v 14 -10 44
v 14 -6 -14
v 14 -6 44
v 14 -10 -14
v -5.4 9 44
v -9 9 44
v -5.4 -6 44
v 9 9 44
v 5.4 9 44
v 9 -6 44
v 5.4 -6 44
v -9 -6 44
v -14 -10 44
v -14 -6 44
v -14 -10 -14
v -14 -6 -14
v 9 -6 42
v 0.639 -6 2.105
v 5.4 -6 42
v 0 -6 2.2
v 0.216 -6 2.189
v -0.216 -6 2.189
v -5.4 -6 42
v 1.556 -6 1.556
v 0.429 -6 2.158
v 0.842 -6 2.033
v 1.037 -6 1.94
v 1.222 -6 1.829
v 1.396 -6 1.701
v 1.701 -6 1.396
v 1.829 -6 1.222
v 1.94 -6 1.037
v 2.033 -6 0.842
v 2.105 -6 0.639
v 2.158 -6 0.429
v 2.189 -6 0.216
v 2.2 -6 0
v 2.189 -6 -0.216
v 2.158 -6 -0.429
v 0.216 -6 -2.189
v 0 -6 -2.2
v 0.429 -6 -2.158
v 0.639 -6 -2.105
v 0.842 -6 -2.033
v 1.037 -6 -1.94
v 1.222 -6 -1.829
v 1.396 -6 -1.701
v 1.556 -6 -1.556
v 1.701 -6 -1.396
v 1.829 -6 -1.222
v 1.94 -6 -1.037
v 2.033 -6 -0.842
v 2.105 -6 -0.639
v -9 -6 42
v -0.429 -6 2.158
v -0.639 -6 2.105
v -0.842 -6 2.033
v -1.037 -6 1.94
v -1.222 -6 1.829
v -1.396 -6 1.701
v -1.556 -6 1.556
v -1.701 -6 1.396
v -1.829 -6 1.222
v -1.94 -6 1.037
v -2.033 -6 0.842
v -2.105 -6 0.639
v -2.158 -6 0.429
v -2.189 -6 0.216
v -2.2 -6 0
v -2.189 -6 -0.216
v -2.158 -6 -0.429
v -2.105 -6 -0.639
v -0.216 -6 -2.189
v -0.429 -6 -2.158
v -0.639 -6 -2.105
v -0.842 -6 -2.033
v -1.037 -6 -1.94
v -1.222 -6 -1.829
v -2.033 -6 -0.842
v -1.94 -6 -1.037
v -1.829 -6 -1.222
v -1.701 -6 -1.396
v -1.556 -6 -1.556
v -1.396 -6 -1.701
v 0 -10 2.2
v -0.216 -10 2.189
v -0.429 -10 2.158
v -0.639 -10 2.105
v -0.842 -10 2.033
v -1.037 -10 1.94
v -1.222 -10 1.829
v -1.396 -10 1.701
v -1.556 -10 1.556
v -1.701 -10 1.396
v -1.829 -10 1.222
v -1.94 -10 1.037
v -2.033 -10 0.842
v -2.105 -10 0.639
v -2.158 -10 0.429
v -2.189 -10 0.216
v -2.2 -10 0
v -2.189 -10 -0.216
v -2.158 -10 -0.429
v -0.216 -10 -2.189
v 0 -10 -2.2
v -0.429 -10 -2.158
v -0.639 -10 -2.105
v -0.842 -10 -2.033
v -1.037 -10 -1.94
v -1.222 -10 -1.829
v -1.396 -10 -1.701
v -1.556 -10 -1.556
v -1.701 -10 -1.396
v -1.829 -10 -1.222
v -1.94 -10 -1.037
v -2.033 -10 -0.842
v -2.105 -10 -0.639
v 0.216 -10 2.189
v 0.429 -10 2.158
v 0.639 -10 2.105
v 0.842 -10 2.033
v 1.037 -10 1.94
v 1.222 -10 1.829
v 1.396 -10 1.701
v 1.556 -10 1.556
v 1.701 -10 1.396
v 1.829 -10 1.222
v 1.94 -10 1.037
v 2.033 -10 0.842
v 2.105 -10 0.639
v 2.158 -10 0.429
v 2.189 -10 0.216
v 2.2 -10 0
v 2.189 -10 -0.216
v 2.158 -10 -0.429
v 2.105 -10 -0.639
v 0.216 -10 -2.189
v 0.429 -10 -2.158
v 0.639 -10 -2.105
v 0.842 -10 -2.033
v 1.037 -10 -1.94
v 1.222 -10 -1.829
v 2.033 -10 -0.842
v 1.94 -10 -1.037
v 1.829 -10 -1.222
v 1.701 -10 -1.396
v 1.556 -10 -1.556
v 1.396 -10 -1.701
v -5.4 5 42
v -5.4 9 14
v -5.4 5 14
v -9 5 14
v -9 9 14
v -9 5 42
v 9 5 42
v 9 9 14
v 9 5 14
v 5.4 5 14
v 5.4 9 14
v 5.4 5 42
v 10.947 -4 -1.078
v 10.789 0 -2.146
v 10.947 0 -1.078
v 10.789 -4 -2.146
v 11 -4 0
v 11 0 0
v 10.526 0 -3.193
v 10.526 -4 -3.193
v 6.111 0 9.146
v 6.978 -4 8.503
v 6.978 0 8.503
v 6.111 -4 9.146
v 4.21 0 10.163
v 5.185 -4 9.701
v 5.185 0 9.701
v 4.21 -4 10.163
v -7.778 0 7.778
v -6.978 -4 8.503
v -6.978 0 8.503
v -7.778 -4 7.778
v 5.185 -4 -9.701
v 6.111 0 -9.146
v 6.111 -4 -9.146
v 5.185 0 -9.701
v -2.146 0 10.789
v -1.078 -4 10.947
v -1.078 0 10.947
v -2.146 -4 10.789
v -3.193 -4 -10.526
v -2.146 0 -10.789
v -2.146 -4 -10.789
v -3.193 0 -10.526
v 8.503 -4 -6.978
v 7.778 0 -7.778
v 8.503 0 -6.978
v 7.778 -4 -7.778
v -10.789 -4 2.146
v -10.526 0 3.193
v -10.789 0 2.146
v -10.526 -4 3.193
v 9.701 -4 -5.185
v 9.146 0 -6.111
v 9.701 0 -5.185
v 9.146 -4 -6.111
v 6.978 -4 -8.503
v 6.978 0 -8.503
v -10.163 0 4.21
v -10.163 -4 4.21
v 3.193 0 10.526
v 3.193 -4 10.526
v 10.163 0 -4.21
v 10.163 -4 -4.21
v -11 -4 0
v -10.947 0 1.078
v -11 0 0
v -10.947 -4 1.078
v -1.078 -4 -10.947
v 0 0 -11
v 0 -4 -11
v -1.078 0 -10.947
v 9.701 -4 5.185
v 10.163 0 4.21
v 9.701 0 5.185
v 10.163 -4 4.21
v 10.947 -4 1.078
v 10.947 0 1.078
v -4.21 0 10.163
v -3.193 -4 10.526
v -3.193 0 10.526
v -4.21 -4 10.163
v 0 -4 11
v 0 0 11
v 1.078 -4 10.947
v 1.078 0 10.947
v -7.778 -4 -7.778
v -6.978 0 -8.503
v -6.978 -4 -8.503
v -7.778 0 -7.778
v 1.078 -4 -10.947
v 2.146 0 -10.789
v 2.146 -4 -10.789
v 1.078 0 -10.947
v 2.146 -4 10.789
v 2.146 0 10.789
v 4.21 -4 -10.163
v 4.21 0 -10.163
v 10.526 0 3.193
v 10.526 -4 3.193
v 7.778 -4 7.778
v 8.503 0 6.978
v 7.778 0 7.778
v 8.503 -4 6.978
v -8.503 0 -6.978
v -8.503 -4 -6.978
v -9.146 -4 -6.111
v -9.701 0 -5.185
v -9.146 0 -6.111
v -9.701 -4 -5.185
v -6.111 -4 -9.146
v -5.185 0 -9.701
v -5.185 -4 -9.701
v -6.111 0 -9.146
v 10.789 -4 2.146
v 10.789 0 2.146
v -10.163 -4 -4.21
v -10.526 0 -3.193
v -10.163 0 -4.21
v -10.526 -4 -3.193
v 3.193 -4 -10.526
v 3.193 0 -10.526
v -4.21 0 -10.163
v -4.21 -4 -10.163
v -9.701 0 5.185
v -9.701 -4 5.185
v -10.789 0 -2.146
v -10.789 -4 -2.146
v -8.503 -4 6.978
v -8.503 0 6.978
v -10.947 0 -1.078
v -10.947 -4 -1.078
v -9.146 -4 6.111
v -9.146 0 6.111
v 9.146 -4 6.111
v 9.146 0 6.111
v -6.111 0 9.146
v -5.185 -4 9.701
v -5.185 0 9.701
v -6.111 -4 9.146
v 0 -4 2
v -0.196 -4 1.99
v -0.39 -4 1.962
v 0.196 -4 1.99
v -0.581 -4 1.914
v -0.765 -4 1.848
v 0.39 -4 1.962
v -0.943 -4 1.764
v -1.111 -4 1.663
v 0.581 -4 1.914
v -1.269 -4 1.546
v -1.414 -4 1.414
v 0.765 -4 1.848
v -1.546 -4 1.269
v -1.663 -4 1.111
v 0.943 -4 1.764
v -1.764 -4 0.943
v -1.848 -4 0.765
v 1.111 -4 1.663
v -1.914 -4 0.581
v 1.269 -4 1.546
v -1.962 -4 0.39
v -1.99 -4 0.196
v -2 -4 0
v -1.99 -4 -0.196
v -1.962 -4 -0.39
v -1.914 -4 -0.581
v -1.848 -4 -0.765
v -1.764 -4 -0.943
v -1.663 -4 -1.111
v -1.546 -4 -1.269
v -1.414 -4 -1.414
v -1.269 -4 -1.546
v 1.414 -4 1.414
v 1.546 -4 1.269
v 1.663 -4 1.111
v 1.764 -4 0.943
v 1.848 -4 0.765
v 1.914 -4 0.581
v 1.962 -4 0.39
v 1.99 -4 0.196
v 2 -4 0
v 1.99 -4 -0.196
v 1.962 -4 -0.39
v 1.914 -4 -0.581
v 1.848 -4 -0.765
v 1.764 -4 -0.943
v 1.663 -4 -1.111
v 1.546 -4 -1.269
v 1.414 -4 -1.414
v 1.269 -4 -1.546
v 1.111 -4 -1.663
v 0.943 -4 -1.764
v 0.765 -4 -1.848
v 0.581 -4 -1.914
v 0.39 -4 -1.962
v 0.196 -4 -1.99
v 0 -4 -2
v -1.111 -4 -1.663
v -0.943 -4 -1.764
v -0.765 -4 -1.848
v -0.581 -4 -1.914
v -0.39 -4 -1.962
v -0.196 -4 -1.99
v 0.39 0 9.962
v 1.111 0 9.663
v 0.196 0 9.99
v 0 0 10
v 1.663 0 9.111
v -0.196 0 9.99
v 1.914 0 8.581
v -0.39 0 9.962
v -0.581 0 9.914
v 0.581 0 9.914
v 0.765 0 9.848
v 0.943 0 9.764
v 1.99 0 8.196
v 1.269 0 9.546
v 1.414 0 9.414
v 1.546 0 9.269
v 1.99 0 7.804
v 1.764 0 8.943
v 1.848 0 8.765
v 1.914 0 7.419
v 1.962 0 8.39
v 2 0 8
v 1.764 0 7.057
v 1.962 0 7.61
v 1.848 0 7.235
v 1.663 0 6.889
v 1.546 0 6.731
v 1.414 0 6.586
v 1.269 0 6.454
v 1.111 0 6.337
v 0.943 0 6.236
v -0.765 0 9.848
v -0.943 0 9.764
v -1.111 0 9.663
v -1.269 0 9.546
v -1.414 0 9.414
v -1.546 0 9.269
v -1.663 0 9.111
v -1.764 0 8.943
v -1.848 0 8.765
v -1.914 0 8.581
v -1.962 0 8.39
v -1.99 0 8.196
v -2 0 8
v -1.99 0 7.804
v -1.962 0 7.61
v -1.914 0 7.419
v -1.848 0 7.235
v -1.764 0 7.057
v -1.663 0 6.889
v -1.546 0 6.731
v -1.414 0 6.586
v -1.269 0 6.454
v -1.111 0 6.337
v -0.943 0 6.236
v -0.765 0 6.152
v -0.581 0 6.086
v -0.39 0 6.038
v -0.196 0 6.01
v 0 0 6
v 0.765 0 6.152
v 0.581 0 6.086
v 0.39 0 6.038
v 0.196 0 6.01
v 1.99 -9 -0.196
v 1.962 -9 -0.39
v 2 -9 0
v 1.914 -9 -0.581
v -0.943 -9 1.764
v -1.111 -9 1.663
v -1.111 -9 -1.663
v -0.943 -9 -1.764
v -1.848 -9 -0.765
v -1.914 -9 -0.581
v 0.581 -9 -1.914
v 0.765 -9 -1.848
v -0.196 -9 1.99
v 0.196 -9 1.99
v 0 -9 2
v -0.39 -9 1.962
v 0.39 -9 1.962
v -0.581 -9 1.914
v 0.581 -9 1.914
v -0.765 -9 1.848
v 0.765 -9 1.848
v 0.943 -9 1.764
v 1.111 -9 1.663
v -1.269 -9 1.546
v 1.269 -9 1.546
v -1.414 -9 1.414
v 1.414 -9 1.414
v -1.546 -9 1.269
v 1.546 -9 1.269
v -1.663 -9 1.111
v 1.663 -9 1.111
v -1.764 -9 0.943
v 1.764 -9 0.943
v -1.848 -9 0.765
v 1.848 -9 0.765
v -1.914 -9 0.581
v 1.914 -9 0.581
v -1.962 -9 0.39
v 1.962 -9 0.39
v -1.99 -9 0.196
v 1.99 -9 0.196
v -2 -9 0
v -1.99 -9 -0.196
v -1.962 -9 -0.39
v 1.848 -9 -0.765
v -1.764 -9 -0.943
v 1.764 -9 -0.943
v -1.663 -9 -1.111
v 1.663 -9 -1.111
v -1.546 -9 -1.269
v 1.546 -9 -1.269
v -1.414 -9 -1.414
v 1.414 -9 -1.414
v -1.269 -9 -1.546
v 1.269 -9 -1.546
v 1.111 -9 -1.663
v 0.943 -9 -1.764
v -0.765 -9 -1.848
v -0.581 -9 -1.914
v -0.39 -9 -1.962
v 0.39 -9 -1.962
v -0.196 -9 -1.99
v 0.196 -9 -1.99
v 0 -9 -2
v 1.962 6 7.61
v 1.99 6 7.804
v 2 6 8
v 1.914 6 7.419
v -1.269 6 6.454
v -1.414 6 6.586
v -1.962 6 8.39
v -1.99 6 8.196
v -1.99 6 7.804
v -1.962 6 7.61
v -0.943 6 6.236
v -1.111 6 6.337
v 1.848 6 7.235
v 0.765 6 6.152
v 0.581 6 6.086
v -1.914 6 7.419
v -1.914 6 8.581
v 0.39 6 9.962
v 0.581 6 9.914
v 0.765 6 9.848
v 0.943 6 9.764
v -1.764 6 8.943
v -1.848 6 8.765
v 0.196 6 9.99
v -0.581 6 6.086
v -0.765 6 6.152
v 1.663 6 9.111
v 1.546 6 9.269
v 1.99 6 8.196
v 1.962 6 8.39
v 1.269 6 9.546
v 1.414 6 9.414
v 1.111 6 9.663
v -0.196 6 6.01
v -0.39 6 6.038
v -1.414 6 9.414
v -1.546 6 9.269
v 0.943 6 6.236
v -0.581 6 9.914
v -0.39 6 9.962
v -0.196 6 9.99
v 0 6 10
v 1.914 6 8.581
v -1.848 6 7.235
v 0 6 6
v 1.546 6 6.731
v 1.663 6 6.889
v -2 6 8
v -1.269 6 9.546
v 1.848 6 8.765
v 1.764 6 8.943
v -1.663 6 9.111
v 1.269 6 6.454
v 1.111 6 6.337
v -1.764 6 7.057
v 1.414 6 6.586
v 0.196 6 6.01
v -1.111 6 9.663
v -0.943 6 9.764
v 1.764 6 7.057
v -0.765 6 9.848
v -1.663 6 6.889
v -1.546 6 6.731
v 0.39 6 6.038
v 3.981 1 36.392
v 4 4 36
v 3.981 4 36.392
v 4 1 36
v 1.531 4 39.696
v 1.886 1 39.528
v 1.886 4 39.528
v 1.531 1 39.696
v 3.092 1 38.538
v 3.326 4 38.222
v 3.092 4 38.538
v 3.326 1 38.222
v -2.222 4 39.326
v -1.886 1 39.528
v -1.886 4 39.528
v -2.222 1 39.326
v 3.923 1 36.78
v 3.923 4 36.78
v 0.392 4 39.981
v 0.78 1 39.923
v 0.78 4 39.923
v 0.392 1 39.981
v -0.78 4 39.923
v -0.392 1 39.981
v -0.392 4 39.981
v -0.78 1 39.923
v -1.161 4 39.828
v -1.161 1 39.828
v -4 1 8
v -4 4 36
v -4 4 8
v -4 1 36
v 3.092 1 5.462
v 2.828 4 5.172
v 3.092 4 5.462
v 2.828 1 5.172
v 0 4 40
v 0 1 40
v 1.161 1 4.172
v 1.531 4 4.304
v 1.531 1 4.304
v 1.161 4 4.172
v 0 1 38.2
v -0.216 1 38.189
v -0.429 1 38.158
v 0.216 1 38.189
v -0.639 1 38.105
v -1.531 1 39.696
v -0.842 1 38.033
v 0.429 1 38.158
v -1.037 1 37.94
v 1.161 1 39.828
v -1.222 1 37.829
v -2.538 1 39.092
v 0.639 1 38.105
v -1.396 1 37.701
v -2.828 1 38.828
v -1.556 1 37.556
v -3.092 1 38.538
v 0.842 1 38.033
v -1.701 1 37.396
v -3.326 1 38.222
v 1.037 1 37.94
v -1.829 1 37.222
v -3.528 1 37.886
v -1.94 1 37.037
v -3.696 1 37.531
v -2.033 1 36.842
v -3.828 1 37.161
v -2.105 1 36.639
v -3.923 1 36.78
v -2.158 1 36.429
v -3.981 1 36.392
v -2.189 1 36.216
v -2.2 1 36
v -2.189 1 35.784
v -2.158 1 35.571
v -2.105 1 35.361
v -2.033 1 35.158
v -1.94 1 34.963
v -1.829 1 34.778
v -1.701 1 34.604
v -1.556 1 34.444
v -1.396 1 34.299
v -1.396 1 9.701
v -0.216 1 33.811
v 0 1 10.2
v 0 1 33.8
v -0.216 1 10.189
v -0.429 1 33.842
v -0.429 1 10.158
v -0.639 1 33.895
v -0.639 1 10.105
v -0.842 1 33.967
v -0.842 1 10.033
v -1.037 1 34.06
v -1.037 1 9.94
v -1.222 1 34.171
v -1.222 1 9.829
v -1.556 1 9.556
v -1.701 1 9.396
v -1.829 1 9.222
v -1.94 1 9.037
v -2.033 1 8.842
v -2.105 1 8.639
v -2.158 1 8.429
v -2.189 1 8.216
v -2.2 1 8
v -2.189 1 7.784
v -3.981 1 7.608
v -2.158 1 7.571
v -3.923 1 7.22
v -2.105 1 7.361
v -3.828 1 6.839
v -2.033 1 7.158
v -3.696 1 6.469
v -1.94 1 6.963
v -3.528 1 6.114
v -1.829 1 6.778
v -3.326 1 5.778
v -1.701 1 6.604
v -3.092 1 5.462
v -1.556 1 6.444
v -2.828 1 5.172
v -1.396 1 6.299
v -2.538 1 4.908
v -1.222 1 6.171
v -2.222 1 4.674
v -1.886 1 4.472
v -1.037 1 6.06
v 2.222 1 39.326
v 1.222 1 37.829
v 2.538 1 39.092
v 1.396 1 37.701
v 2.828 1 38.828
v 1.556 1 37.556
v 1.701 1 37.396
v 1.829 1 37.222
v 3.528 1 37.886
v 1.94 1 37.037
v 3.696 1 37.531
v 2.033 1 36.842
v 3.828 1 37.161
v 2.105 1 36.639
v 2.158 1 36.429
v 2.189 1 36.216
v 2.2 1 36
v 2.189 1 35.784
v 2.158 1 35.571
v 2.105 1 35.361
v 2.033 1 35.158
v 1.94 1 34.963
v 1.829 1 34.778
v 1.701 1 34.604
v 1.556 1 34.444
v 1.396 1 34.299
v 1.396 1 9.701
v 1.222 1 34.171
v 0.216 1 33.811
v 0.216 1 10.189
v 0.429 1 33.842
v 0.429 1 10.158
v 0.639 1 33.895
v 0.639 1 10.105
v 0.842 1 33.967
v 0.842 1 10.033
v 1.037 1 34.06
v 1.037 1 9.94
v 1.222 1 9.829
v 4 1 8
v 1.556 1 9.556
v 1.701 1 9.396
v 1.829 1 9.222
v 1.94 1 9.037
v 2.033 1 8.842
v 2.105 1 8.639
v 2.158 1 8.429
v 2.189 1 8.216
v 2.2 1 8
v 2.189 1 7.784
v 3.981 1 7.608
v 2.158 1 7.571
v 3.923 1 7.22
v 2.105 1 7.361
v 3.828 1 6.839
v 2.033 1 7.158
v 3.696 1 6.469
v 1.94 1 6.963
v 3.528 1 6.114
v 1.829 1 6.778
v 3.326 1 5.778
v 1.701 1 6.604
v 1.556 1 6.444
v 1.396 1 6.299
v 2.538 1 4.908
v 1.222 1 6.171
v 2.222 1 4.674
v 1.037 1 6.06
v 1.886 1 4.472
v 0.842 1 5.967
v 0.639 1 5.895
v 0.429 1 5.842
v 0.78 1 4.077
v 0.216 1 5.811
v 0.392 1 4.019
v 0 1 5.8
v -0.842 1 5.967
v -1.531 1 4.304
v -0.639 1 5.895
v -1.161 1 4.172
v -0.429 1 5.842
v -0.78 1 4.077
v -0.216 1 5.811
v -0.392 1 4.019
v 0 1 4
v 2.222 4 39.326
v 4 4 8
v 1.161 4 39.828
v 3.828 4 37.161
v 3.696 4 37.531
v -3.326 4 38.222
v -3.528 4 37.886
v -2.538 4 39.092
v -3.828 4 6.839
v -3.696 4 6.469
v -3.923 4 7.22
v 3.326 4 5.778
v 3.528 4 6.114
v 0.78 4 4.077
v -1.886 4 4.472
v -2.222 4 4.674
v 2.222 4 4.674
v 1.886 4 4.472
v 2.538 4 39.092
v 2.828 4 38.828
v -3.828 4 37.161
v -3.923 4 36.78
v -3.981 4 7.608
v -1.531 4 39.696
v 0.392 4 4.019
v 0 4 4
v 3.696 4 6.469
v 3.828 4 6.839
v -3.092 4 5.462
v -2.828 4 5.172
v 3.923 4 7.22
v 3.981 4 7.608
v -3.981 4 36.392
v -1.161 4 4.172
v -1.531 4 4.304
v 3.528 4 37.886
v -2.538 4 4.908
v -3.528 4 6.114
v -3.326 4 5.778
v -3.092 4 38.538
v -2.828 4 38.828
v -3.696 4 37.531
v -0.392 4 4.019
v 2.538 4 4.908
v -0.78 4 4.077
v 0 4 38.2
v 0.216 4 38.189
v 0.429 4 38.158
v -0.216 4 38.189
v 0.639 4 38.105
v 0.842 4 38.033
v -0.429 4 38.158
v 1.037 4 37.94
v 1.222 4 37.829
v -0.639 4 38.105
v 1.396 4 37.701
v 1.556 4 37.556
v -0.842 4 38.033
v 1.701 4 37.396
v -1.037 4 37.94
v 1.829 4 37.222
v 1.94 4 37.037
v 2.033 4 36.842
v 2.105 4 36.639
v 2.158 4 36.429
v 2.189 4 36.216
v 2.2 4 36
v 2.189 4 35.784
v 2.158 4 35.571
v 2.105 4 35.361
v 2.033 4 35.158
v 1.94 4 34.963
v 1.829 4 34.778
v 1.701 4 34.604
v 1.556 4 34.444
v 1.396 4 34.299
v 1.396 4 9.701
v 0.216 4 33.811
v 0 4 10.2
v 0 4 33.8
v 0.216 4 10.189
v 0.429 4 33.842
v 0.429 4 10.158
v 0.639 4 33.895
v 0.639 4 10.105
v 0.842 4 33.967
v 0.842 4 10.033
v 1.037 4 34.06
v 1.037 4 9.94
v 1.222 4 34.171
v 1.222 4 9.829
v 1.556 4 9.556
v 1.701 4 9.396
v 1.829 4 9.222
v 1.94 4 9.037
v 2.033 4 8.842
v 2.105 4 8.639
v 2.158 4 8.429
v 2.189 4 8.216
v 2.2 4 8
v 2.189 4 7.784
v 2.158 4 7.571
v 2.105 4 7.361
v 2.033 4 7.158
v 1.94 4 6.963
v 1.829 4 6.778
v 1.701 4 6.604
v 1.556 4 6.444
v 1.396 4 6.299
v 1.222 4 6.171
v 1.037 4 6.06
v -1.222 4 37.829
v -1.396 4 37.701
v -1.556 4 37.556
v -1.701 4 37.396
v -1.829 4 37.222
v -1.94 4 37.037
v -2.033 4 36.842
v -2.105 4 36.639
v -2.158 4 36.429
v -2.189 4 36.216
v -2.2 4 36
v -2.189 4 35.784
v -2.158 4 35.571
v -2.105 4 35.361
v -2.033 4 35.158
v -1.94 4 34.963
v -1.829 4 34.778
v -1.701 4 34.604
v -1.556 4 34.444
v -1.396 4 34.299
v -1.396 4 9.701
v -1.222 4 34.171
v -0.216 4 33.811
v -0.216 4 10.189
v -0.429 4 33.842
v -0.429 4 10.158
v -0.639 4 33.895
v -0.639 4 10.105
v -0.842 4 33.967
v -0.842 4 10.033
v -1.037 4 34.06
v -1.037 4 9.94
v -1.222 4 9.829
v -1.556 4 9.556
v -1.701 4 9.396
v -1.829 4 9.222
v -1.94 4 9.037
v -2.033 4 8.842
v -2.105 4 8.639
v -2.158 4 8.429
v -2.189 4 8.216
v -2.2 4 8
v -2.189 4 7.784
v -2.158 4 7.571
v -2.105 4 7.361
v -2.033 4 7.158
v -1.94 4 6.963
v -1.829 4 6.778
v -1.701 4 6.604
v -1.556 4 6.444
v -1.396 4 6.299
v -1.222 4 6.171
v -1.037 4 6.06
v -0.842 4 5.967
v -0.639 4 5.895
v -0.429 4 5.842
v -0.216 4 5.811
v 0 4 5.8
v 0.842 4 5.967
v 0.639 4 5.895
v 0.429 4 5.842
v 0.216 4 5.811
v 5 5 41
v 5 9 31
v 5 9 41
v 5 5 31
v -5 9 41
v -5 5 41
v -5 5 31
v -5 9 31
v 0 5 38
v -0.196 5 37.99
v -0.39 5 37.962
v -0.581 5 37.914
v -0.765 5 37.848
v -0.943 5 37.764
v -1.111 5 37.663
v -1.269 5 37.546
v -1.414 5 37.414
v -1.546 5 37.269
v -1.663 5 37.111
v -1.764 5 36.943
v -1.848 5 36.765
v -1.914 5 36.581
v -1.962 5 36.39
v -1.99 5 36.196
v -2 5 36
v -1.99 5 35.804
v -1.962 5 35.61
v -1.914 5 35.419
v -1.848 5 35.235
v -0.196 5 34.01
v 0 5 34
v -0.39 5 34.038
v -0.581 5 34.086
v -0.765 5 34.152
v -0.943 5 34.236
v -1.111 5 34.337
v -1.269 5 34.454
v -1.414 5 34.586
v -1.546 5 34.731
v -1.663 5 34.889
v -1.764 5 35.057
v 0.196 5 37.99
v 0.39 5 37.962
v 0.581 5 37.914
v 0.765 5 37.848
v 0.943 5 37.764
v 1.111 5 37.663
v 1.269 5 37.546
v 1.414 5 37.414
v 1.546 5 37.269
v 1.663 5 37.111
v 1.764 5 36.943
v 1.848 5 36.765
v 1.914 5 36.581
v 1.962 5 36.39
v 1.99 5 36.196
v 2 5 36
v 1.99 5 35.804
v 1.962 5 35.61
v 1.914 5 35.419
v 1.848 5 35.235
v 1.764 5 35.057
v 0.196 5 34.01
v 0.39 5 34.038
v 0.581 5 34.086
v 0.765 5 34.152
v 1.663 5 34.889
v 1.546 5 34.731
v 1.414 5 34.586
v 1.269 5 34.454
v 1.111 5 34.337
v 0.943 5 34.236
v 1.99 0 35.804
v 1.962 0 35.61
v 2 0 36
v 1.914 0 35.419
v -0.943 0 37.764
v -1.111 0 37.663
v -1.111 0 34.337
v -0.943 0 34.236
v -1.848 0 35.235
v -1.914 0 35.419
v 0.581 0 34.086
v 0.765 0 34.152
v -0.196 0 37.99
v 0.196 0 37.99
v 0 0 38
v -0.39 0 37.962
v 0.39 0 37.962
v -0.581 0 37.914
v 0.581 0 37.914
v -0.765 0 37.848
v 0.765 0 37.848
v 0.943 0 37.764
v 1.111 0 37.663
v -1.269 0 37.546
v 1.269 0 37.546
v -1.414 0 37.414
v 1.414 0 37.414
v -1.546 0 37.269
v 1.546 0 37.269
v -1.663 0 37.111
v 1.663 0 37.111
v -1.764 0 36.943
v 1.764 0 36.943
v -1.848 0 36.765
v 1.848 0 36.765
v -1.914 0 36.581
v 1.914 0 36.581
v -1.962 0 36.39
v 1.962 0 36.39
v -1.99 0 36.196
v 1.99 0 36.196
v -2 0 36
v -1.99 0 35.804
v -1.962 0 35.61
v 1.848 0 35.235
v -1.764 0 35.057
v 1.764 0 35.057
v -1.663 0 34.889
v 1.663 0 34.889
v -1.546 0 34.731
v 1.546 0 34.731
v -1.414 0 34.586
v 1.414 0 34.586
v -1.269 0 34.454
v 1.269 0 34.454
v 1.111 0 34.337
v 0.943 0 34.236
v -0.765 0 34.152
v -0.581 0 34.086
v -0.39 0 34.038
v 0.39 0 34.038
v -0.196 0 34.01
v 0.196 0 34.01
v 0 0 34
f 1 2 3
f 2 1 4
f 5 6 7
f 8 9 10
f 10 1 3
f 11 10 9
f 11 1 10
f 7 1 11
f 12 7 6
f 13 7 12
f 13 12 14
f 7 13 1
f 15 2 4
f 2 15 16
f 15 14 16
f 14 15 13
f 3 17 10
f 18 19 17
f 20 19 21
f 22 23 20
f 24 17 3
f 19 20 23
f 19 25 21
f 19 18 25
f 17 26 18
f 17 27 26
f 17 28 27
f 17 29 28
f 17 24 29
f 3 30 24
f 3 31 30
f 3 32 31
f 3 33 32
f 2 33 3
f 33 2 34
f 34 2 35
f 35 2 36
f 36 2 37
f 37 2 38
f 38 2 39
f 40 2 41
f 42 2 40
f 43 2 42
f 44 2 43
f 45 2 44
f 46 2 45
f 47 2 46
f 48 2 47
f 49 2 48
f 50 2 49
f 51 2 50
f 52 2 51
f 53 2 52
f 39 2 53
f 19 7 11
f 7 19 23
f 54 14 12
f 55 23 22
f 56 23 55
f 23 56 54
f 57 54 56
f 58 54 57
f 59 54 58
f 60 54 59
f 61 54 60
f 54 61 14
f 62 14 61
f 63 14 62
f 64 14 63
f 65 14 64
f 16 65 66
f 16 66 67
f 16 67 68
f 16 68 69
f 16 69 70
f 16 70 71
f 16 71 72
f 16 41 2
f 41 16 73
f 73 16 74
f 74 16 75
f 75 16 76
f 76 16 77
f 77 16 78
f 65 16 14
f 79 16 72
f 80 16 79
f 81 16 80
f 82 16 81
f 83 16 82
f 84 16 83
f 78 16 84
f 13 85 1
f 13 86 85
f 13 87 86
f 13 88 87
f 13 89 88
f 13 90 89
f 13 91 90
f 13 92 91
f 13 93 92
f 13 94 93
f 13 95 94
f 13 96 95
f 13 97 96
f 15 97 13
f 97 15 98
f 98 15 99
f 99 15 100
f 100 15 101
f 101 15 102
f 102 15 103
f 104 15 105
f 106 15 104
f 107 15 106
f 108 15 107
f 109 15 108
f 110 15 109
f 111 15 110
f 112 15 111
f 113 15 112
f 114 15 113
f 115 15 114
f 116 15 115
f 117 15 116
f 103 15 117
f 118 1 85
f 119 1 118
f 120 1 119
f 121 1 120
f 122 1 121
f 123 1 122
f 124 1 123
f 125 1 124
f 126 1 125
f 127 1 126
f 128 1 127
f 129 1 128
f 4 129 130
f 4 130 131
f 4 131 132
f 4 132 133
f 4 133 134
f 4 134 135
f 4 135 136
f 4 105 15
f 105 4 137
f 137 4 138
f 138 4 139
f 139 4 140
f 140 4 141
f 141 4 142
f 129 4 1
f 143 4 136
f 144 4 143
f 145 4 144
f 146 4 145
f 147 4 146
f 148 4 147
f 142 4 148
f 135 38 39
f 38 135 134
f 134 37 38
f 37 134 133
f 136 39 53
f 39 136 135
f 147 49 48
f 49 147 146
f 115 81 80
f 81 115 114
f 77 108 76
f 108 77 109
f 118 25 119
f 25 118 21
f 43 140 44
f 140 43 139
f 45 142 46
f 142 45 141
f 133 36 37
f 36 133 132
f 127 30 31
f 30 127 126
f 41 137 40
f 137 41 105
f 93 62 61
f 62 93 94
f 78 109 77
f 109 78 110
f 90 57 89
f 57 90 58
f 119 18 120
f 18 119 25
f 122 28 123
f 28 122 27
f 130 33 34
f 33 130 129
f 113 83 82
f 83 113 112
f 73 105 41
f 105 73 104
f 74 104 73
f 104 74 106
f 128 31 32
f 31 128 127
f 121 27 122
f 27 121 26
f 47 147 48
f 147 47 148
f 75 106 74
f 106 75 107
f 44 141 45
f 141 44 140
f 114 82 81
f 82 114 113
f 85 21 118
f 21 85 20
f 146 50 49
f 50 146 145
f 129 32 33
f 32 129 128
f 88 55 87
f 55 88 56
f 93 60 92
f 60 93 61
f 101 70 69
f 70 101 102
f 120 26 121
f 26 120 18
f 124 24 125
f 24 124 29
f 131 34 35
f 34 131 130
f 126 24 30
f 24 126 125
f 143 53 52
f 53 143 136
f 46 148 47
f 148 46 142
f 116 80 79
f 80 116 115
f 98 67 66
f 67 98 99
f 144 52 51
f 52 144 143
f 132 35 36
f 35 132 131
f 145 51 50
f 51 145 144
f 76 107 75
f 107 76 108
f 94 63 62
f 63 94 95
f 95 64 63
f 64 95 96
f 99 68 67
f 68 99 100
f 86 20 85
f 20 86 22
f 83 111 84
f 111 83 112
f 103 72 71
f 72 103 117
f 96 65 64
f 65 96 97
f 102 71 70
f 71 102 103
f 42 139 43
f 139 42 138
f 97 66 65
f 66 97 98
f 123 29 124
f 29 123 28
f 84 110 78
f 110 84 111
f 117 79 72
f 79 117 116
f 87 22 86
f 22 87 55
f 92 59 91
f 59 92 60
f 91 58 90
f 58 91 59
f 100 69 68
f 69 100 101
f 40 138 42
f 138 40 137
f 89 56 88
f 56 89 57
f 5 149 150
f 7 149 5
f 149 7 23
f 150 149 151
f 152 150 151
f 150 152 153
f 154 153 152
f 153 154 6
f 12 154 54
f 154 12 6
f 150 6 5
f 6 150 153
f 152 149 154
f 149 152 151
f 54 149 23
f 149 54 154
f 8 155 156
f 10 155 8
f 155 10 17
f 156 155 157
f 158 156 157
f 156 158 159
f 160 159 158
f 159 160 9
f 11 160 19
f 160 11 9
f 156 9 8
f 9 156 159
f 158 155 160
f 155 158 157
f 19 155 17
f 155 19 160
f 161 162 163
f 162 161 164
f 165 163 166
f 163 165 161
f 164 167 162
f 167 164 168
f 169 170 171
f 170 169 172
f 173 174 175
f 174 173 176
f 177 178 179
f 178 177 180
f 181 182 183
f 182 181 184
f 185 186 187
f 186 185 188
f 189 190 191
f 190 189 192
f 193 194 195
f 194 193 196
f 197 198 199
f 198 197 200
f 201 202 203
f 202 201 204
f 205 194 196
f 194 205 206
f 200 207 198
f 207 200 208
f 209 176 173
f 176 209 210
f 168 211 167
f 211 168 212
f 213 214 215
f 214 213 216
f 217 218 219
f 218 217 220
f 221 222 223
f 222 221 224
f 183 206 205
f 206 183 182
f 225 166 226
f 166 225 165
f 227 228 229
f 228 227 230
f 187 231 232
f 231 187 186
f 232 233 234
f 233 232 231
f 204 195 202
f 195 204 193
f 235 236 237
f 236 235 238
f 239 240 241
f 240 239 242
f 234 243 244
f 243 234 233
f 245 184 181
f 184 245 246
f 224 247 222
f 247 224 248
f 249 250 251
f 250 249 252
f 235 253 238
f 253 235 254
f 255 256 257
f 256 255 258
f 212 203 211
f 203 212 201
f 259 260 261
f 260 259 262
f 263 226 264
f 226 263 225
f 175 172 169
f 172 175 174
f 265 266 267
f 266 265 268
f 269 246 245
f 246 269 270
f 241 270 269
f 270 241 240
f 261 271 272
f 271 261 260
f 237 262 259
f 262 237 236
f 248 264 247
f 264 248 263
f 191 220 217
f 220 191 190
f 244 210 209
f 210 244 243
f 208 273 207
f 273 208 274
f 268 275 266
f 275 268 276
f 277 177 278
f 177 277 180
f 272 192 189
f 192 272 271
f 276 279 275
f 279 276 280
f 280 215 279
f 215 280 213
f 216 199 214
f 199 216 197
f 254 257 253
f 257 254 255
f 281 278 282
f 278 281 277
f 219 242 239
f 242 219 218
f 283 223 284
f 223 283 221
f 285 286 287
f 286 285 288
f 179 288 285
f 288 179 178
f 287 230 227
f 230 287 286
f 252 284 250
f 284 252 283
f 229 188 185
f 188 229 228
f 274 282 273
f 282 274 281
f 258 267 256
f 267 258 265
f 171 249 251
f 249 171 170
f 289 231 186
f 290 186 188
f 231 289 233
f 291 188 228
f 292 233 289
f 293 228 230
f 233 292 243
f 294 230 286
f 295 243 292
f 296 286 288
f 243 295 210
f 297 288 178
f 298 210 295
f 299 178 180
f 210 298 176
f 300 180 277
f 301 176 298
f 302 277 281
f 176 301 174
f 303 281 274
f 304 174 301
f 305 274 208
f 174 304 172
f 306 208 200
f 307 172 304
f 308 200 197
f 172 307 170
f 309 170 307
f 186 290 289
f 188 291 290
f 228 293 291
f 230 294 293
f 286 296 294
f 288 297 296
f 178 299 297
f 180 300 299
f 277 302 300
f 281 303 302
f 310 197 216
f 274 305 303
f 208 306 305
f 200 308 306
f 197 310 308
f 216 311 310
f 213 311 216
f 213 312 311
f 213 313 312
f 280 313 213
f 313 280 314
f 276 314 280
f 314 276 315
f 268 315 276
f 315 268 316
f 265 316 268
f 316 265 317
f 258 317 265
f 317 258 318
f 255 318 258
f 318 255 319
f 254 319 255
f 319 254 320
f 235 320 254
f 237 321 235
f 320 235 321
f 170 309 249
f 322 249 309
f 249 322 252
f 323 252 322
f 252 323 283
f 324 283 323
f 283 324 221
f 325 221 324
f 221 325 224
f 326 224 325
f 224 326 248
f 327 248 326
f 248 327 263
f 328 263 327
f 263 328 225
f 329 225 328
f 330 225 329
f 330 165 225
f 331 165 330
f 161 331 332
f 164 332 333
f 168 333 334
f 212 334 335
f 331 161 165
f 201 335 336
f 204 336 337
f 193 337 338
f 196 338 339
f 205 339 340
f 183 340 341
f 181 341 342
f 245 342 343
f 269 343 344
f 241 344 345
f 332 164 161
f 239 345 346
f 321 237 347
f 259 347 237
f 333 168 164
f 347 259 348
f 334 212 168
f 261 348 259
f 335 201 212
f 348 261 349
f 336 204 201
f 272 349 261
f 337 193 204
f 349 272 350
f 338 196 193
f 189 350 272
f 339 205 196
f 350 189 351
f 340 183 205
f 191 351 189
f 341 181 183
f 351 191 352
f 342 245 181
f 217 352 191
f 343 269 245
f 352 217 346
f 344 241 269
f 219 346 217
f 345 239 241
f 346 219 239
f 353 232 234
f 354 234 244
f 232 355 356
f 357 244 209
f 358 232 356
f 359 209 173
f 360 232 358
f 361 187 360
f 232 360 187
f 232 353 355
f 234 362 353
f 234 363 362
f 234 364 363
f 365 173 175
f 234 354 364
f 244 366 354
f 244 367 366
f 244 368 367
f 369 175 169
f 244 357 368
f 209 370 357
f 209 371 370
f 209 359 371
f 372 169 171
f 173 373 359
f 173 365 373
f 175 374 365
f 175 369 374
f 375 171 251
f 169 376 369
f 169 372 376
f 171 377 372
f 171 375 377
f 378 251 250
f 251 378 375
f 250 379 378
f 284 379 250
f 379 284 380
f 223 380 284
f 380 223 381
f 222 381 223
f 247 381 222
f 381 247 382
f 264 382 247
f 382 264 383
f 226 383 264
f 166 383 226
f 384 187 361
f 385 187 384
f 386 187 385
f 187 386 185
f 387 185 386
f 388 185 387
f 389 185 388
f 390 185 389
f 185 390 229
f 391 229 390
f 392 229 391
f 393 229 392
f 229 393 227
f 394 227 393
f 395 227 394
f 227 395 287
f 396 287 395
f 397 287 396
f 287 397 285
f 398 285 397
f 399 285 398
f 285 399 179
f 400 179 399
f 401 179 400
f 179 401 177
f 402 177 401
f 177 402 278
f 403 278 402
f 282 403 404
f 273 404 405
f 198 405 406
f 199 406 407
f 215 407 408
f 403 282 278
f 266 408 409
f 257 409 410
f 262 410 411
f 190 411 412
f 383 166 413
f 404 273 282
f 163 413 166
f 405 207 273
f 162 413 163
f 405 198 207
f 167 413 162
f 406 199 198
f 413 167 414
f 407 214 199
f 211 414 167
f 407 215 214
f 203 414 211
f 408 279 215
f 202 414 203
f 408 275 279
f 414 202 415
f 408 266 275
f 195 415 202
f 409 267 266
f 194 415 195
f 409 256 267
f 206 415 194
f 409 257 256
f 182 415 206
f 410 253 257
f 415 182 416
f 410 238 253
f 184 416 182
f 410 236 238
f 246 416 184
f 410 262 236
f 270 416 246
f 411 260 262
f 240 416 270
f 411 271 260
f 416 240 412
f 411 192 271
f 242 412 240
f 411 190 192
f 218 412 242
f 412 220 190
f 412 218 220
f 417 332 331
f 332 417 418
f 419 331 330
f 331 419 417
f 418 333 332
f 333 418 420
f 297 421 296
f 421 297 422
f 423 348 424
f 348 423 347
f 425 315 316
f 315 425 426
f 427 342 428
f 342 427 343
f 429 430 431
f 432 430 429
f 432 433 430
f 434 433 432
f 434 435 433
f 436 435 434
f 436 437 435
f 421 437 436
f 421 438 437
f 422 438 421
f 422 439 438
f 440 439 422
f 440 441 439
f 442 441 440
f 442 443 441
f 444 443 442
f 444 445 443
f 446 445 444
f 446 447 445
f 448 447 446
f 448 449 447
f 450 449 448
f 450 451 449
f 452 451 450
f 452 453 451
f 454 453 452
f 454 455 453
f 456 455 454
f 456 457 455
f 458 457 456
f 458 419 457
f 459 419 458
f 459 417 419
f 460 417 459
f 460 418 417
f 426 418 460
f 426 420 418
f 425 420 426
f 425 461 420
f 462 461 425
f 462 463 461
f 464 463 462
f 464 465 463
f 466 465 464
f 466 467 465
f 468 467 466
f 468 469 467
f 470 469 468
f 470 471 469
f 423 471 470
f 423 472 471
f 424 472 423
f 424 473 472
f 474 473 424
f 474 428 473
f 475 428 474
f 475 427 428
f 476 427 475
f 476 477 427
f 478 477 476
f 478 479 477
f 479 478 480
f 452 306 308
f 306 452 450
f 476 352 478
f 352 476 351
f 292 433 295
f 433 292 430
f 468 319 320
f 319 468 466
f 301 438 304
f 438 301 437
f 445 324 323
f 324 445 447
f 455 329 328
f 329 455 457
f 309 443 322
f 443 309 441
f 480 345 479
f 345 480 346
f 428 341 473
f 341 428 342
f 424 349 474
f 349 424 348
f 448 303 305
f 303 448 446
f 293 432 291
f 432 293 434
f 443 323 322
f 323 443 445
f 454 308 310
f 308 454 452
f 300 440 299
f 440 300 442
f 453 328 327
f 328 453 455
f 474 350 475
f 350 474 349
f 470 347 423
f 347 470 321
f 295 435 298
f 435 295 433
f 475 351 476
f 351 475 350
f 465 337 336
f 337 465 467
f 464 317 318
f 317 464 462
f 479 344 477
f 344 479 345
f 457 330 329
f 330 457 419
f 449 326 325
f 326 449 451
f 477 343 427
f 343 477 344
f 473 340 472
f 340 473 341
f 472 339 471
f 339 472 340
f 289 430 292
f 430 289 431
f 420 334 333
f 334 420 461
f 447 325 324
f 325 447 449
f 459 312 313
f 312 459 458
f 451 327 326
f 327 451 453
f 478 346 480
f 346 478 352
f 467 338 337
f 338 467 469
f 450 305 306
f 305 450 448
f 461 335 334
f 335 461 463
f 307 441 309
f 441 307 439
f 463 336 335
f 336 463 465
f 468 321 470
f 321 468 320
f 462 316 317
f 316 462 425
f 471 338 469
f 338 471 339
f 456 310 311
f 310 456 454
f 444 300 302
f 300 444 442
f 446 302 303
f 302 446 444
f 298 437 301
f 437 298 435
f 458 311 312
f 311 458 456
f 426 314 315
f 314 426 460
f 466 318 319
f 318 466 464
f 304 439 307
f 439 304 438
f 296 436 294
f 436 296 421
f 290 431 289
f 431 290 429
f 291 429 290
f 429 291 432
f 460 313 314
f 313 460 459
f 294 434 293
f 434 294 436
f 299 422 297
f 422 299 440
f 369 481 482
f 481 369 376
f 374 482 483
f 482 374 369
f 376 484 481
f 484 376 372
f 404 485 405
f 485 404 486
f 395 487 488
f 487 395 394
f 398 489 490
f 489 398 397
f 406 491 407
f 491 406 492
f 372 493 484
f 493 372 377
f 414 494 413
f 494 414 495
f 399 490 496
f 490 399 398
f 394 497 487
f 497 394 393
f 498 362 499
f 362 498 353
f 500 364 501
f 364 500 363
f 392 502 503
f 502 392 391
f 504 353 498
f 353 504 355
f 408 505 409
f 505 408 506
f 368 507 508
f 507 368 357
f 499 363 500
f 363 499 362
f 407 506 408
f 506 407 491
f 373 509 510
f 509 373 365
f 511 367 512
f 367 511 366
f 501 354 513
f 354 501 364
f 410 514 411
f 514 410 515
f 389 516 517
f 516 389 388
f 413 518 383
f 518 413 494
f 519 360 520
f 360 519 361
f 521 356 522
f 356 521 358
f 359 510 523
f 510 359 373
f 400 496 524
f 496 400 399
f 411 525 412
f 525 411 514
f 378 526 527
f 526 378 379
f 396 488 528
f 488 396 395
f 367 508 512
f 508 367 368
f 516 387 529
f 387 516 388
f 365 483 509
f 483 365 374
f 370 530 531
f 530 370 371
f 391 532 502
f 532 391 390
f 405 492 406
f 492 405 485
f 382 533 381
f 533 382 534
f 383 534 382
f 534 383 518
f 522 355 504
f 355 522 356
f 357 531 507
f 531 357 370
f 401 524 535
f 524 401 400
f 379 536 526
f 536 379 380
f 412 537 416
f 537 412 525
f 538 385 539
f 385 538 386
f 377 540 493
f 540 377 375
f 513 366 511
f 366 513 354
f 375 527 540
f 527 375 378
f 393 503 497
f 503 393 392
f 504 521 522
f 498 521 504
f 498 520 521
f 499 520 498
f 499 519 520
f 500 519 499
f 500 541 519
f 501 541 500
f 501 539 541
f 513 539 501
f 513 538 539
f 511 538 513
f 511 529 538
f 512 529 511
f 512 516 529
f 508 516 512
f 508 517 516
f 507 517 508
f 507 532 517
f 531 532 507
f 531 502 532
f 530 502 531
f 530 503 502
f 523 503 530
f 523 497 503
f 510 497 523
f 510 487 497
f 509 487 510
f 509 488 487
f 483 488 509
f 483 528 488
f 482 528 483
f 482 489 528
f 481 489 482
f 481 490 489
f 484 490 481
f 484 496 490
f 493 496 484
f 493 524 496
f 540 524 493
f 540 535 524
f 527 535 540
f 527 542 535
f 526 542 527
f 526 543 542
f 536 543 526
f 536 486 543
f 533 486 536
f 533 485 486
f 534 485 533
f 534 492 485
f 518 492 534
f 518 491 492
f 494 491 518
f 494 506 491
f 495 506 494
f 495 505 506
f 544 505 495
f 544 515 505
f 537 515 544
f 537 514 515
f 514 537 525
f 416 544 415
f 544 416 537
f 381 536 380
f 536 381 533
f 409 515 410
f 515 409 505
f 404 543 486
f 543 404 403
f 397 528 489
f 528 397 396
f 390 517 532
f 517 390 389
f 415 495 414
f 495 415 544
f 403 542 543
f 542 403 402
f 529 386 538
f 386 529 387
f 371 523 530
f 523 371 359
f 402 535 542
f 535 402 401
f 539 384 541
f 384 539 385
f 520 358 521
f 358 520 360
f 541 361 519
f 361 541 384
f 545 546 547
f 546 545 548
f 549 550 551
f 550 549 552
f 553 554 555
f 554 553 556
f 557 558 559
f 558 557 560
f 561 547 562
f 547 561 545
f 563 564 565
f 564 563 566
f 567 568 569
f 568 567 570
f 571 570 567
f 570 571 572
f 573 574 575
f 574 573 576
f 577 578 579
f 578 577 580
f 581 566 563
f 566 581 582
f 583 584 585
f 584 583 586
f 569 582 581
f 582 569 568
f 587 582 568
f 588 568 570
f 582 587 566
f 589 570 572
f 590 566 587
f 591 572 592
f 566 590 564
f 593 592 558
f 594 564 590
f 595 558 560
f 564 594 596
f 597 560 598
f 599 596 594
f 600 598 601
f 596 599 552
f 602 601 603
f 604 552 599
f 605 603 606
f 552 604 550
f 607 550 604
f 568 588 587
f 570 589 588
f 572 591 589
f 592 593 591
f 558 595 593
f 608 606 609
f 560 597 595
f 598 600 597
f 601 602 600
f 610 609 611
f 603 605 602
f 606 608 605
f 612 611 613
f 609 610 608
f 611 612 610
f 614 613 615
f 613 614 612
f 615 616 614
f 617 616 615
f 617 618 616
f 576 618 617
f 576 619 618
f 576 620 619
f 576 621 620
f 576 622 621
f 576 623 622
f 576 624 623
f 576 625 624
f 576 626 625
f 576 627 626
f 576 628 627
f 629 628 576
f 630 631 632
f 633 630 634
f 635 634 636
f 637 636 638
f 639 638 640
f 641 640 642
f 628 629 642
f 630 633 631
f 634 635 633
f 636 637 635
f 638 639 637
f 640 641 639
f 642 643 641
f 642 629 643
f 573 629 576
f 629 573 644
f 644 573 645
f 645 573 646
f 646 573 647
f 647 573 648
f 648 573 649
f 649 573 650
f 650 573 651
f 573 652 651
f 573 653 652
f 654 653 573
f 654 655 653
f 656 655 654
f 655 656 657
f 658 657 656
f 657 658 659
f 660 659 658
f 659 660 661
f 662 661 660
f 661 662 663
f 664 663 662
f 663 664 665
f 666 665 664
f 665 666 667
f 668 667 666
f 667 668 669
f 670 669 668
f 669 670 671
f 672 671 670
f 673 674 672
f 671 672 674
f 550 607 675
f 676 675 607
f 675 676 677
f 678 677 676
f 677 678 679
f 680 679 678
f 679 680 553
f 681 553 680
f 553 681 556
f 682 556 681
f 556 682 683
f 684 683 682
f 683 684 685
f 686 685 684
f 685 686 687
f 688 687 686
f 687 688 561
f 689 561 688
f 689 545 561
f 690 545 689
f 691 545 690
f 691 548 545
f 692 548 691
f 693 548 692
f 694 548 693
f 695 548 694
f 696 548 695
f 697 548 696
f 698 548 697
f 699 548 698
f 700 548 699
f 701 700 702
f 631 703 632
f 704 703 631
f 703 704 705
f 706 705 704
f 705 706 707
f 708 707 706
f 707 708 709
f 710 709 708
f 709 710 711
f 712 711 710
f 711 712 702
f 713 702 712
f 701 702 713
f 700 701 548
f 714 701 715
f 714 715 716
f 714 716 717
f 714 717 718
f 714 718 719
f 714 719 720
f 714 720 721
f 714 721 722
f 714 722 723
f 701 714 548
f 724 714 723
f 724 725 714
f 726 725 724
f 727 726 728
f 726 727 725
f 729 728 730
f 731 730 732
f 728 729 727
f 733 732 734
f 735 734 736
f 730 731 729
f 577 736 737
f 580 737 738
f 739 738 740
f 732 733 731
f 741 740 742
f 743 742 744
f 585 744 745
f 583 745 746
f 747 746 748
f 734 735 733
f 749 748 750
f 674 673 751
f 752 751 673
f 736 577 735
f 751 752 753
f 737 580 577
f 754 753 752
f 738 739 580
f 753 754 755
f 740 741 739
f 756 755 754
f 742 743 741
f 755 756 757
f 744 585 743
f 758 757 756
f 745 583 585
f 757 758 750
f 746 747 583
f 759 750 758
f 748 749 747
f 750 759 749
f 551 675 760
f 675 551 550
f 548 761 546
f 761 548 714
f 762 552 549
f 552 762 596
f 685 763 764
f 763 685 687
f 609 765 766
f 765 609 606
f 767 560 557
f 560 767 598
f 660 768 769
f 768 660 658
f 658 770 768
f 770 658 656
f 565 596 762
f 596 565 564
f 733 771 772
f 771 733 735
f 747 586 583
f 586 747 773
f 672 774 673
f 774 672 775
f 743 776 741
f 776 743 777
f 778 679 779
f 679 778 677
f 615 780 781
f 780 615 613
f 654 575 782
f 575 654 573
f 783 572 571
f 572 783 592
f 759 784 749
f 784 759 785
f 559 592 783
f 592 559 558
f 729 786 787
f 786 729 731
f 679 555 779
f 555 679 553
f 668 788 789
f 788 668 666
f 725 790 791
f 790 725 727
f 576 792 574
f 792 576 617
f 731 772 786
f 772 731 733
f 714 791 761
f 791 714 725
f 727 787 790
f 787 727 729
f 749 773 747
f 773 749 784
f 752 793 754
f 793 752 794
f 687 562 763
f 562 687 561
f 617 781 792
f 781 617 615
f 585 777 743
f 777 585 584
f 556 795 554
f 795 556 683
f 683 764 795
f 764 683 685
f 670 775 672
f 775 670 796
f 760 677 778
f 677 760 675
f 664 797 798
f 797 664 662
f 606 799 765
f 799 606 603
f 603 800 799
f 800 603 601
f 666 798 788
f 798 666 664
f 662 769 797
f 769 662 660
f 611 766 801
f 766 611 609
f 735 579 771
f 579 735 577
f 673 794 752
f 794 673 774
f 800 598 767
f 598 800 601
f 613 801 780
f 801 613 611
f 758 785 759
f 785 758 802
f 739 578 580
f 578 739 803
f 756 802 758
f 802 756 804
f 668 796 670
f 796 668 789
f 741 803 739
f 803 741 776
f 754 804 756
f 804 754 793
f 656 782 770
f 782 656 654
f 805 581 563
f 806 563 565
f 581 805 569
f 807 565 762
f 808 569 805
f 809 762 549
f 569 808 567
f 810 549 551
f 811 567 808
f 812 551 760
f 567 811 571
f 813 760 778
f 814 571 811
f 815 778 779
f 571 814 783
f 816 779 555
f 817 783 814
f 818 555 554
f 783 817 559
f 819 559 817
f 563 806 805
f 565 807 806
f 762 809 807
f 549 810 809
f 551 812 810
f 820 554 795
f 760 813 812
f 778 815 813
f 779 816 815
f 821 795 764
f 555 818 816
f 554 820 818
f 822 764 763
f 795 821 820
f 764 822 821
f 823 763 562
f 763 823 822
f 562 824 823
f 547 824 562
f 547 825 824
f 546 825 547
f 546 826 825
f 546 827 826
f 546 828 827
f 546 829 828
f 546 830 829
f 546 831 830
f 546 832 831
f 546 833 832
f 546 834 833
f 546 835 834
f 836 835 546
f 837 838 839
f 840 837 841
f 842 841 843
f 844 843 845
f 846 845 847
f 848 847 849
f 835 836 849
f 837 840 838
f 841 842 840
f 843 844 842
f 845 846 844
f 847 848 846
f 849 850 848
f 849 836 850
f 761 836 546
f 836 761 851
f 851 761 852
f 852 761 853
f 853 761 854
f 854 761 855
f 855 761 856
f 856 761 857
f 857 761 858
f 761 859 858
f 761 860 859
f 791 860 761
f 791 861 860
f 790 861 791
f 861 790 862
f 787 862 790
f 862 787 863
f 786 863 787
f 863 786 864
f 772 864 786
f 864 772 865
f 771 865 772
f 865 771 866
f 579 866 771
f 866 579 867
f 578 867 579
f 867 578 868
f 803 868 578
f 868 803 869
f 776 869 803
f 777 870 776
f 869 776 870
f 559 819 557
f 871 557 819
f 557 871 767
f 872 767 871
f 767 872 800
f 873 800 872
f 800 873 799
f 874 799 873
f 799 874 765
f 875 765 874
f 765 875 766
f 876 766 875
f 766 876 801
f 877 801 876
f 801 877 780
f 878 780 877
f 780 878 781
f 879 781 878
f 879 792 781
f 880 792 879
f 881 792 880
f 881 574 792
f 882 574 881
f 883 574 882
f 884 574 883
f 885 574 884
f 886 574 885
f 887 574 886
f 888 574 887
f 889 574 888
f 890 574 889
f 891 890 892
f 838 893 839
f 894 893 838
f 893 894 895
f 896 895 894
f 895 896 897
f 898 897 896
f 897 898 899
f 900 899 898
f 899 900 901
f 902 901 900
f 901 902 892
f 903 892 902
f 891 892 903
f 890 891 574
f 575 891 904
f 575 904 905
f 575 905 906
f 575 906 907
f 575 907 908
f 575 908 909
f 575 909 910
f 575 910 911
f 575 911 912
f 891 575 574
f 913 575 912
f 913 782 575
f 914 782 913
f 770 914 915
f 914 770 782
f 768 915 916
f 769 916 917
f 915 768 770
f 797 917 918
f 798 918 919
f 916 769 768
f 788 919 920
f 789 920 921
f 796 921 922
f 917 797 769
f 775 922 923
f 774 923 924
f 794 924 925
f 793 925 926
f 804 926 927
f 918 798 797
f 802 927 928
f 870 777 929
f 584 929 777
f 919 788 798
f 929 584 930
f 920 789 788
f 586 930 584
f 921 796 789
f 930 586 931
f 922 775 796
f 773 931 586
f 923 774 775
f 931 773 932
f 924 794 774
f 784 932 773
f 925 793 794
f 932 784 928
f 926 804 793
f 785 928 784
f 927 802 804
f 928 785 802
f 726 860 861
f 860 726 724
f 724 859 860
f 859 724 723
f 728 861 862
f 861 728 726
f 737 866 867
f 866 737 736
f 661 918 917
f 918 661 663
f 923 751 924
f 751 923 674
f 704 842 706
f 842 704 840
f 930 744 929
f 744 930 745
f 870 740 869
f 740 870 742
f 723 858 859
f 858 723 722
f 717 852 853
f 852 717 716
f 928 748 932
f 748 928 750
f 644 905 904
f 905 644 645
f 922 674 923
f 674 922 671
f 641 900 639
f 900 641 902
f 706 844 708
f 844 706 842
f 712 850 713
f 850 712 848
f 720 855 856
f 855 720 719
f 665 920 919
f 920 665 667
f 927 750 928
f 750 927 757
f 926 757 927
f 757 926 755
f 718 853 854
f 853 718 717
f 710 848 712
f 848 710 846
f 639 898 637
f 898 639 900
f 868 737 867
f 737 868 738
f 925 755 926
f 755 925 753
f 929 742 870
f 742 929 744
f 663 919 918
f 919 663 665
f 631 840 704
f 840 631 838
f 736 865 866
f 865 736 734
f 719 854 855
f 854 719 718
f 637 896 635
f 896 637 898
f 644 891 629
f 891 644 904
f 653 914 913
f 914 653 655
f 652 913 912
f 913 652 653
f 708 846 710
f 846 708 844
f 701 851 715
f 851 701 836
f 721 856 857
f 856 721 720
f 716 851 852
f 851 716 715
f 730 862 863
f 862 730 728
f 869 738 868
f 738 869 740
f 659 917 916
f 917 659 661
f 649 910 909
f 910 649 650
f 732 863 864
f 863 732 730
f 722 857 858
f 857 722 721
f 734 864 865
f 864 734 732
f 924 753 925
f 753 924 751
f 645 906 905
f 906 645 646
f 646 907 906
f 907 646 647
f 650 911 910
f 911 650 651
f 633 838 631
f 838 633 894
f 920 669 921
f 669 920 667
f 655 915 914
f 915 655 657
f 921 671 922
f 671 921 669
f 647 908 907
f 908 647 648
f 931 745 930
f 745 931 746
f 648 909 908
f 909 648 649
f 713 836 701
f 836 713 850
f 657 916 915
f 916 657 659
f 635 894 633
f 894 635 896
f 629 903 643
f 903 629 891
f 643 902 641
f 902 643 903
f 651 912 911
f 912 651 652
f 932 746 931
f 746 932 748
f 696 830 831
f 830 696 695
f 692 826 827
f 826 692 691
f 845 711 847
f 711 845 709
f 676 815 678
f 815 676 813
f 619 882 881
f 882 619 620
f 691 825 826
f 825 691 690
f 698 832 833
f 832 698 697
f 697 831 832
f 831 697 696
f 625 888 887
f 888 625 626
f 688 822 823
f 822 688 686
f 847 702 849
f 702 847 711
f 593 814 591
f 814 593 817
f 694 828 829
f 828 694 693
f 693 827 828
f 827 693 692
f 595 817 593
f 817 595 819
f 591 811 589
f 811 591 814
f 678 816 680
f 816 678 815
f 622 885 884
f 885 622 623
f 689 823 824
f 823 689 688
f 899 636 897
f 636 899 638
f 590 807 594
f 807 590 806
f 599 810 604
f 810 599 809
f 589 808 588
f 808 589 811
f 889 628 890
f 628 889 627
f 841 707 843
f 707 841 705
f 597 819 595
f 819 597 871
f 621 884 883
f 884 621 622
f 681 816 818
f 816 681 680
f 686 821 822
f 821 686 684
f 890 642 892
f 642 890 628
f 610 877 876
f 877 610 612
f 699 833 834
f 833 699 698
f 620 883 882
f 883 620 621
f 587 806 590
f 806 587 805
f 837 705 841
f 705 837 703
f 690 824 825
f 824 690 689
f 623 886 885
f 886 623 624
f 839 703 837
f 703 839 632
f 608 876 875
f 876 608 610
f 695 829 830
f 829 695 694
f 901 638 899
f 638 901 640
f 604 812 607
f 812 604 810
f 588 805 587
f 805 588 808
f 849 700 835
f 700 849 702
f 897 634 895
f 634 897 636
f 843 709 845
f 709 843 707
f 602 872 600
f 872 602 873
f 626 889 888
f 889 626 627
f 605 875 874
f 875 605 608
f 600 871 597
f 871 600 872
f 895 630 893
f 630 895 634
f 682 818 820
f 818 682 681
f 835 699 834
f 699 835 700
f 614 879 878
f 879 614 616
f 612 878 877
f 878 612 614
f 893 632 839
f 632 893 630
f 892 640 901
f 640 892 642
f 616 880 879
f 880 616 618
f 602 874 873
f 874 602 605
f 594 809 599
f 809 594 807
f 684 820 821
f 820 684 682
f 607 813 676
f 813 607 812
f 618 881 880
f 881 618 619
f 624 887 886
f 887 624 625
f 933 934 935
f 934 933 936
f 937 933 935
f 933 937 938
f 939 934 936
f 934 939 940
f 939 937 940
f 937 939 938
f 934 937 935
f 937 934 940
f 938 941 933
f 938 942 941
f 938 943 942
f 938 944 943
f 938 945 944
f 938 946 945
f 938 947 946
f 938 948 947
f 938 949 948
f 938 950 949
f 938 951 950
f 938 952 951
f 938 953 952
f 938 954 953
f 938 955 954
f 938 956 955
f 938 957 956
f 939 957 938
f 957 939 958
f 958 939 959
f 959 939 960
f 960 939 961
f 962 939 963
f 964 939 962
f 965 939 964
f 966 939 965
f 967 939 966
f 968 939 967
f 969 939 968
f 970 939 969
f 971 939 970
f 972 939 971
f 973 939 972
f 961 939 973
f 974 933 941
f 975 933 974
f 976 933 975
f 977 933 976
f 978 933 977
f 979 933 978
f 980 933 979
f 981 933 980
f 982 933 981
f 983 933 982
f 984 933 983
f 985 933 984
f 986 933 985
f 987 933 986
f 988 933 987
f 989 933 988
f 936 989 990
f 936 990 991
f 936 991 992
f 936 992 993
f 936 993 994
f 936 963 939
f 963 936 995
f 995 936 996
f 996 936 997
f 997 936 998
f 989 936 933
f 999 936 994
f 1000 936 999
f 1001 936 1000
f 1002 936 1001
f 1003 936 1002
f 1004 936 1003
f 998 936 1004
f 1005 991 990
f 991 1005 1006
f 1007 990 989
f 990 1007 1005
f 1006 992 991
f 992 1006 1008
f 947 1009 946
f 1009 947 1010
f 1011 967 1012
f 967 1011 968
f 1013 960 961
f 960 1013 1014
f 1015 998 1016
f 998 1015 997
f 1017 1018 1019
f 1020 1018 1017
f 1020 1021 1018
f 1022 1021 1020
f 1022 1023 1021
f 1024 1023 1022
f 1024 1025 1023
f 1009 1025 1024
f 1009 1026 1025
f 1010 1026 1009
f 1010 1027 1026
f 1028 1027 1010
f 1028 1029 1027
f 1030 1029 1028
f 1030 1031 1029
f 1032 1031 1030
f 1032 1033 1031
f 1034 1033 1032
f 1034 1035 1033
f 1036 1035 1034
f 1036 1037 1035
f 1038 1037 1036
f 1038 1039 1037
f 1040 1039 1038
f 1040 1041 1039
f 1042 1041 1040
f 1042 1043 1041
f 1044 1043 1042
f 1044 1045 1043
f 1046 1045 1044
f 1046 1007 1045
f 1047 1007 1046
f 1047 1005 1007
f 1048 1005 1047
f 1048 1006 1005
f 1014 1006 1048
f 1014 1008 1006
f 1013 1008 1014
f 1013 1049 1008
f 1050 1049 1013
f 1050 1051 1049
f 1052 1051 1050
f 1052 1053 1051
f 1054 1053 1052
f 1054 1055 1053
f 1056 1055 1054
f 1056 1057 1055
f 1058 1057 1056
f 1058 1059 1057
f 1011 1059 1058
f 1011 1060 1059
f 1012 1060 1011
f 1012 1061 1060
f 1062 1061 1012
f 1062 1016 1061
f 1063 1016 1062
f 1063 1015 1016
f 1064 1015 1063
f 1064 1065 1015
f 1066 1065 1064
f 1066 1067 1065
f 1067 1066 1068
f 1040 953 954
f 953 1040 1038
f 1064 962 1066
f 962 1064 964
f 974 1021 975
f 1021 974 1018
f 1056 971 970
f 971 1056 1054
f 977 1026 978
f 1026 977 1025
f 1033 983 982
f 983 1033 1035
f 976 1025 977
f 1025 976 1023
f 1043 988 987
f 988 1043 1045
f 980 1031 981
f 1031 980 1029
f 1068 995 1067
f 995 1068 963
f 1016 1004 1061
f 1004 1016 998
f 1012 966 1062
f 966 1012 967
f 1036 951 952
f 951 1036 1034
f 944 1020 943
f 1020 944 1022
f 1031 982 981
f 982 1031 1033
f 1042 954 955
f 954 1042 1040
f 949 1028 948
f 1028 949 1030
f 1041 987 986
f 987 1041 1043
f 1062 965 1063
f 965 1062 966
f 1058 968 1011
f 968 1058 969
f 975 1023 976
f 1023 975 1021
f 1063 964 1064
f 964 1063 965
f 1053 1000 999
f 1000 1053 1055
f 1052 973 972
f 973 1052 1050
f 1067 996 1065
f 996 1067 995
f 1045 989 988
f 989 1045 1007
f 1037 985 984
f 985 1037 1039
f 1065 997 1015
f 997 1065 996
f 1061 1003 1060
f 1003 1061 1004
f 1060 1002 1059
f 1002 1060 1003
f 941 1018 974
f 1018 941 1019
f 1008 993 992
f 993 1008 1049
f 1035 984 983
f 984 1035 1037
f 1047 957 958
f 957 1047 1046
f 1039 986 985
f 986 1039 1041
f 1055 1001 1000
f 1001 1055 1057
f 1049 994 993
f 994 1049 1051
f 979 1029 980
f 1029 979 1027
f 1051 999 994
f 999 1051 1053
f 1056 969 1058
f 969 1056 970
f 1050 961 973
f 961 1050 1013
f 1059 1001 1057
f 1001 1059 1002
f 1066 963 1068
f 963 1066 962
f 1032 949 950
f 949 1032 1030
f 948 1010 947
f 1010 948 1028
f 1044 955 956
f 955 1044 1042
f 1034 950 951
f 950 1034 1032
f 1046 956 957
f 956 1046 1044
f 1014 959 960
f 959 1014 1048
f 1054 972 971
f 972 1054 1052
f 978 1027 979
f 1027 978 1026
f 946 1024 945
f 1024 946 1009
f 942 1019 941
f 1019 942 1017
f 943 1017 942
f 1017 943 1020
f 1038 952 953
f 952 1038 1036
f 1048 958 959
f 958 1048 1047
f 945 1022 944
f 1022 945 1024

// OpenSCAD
// Original low-speed slider-crank verification fixture, millimetres.
// Four manufacturing parts. Pins are integral; external axial retention is
// required. No load capacity, print tolerance or physical function is claimed.
agentscad_part = "all";
agentscad_pose = false;
motion_angle = 0;
crank_radius = 8;
rod_length = 28;
$fn = 64;

// All pin axes are parallel to +Y; the mechanism moves in the XZ plane.
module y_cylinder(radius, height) { rotate([-90, 0, 0]) cylinder(r=radius, h=height); }
module crank_local() {
  union() {
    translate([0, -4, 0]) y_cylinder(crank_radius + 3, 4);
    translate([0, -9, 0]) y_cylinder(2, 5.1);
    translate([0, -0.1, crank_radius]) y_cylinder(2, 6.1);
  }
}
module rod_local() {
  difference() {
    hull() {
      translate([0, 1, 0]) y_cylinder(4, 3);
      translate([0, 1, rod_length]) y_cylinder(4, 3);
    }
    translate([0, 0.9, 0]) y_cylinder(2.2, 3.2);
    translate([0, 0.9, rod_length]) y_cylinder(2.2, 3.2);
  }
}
module slider_local() {
  union() {
    translate([-5, 5, -5]) cube([10, 4, 10]);
    y_cylinder(2, 5.1);
  }
}
module frame_local() {
  union() {
    difference() {
      translate([-14, -10, -14]) cube([28, 4, 58]);
      translate([0, -10.1, 0]) y_cylinder(2.2, 4.2);
    }
    for (x = [-9, 5.4]) {
      translate([x, 5, 14]) cube([3.6, 4, 30]);
      translate([x, -6.1, 42]) cube([3.6, 11.2, 2]);
    }
  }
}

// Source-side construction. The checker measures the resulting mesh contours;
// it never consumes these functions or their computed coordinates as evidence.
cx = crank_radius * sin(motion_angle);
cz = crank_radius * cos(motion_angle);
travel = sqrt(rod_length * rod_length - cx * cx);
pz = cz + travel;
rod_angle = 0;
module selected_part(id, placed) {
  if (id == "frame") frame_local();
  if (id == "crank") rotate([0, placed ? motion_angle : 0, 0]) crank_local();
  if (id == "rod") translate(placed ? [cx, 0, cz] : [0, 0, 0])
    rotate([0, placed ? rod_angle : 0, 0]) rod_local();
  if (id == "slider") translate([0, 0, placed ? pz : 0]) slider_local();
}
module generated_part() {
  if (agentscad_part == "all") {
    for (id = ["frame", "crank", "rod", "slider"]) selected_part(id, true);
  } else selected_part(agentscad_part, agentscad_pose);
}
generated_part();
